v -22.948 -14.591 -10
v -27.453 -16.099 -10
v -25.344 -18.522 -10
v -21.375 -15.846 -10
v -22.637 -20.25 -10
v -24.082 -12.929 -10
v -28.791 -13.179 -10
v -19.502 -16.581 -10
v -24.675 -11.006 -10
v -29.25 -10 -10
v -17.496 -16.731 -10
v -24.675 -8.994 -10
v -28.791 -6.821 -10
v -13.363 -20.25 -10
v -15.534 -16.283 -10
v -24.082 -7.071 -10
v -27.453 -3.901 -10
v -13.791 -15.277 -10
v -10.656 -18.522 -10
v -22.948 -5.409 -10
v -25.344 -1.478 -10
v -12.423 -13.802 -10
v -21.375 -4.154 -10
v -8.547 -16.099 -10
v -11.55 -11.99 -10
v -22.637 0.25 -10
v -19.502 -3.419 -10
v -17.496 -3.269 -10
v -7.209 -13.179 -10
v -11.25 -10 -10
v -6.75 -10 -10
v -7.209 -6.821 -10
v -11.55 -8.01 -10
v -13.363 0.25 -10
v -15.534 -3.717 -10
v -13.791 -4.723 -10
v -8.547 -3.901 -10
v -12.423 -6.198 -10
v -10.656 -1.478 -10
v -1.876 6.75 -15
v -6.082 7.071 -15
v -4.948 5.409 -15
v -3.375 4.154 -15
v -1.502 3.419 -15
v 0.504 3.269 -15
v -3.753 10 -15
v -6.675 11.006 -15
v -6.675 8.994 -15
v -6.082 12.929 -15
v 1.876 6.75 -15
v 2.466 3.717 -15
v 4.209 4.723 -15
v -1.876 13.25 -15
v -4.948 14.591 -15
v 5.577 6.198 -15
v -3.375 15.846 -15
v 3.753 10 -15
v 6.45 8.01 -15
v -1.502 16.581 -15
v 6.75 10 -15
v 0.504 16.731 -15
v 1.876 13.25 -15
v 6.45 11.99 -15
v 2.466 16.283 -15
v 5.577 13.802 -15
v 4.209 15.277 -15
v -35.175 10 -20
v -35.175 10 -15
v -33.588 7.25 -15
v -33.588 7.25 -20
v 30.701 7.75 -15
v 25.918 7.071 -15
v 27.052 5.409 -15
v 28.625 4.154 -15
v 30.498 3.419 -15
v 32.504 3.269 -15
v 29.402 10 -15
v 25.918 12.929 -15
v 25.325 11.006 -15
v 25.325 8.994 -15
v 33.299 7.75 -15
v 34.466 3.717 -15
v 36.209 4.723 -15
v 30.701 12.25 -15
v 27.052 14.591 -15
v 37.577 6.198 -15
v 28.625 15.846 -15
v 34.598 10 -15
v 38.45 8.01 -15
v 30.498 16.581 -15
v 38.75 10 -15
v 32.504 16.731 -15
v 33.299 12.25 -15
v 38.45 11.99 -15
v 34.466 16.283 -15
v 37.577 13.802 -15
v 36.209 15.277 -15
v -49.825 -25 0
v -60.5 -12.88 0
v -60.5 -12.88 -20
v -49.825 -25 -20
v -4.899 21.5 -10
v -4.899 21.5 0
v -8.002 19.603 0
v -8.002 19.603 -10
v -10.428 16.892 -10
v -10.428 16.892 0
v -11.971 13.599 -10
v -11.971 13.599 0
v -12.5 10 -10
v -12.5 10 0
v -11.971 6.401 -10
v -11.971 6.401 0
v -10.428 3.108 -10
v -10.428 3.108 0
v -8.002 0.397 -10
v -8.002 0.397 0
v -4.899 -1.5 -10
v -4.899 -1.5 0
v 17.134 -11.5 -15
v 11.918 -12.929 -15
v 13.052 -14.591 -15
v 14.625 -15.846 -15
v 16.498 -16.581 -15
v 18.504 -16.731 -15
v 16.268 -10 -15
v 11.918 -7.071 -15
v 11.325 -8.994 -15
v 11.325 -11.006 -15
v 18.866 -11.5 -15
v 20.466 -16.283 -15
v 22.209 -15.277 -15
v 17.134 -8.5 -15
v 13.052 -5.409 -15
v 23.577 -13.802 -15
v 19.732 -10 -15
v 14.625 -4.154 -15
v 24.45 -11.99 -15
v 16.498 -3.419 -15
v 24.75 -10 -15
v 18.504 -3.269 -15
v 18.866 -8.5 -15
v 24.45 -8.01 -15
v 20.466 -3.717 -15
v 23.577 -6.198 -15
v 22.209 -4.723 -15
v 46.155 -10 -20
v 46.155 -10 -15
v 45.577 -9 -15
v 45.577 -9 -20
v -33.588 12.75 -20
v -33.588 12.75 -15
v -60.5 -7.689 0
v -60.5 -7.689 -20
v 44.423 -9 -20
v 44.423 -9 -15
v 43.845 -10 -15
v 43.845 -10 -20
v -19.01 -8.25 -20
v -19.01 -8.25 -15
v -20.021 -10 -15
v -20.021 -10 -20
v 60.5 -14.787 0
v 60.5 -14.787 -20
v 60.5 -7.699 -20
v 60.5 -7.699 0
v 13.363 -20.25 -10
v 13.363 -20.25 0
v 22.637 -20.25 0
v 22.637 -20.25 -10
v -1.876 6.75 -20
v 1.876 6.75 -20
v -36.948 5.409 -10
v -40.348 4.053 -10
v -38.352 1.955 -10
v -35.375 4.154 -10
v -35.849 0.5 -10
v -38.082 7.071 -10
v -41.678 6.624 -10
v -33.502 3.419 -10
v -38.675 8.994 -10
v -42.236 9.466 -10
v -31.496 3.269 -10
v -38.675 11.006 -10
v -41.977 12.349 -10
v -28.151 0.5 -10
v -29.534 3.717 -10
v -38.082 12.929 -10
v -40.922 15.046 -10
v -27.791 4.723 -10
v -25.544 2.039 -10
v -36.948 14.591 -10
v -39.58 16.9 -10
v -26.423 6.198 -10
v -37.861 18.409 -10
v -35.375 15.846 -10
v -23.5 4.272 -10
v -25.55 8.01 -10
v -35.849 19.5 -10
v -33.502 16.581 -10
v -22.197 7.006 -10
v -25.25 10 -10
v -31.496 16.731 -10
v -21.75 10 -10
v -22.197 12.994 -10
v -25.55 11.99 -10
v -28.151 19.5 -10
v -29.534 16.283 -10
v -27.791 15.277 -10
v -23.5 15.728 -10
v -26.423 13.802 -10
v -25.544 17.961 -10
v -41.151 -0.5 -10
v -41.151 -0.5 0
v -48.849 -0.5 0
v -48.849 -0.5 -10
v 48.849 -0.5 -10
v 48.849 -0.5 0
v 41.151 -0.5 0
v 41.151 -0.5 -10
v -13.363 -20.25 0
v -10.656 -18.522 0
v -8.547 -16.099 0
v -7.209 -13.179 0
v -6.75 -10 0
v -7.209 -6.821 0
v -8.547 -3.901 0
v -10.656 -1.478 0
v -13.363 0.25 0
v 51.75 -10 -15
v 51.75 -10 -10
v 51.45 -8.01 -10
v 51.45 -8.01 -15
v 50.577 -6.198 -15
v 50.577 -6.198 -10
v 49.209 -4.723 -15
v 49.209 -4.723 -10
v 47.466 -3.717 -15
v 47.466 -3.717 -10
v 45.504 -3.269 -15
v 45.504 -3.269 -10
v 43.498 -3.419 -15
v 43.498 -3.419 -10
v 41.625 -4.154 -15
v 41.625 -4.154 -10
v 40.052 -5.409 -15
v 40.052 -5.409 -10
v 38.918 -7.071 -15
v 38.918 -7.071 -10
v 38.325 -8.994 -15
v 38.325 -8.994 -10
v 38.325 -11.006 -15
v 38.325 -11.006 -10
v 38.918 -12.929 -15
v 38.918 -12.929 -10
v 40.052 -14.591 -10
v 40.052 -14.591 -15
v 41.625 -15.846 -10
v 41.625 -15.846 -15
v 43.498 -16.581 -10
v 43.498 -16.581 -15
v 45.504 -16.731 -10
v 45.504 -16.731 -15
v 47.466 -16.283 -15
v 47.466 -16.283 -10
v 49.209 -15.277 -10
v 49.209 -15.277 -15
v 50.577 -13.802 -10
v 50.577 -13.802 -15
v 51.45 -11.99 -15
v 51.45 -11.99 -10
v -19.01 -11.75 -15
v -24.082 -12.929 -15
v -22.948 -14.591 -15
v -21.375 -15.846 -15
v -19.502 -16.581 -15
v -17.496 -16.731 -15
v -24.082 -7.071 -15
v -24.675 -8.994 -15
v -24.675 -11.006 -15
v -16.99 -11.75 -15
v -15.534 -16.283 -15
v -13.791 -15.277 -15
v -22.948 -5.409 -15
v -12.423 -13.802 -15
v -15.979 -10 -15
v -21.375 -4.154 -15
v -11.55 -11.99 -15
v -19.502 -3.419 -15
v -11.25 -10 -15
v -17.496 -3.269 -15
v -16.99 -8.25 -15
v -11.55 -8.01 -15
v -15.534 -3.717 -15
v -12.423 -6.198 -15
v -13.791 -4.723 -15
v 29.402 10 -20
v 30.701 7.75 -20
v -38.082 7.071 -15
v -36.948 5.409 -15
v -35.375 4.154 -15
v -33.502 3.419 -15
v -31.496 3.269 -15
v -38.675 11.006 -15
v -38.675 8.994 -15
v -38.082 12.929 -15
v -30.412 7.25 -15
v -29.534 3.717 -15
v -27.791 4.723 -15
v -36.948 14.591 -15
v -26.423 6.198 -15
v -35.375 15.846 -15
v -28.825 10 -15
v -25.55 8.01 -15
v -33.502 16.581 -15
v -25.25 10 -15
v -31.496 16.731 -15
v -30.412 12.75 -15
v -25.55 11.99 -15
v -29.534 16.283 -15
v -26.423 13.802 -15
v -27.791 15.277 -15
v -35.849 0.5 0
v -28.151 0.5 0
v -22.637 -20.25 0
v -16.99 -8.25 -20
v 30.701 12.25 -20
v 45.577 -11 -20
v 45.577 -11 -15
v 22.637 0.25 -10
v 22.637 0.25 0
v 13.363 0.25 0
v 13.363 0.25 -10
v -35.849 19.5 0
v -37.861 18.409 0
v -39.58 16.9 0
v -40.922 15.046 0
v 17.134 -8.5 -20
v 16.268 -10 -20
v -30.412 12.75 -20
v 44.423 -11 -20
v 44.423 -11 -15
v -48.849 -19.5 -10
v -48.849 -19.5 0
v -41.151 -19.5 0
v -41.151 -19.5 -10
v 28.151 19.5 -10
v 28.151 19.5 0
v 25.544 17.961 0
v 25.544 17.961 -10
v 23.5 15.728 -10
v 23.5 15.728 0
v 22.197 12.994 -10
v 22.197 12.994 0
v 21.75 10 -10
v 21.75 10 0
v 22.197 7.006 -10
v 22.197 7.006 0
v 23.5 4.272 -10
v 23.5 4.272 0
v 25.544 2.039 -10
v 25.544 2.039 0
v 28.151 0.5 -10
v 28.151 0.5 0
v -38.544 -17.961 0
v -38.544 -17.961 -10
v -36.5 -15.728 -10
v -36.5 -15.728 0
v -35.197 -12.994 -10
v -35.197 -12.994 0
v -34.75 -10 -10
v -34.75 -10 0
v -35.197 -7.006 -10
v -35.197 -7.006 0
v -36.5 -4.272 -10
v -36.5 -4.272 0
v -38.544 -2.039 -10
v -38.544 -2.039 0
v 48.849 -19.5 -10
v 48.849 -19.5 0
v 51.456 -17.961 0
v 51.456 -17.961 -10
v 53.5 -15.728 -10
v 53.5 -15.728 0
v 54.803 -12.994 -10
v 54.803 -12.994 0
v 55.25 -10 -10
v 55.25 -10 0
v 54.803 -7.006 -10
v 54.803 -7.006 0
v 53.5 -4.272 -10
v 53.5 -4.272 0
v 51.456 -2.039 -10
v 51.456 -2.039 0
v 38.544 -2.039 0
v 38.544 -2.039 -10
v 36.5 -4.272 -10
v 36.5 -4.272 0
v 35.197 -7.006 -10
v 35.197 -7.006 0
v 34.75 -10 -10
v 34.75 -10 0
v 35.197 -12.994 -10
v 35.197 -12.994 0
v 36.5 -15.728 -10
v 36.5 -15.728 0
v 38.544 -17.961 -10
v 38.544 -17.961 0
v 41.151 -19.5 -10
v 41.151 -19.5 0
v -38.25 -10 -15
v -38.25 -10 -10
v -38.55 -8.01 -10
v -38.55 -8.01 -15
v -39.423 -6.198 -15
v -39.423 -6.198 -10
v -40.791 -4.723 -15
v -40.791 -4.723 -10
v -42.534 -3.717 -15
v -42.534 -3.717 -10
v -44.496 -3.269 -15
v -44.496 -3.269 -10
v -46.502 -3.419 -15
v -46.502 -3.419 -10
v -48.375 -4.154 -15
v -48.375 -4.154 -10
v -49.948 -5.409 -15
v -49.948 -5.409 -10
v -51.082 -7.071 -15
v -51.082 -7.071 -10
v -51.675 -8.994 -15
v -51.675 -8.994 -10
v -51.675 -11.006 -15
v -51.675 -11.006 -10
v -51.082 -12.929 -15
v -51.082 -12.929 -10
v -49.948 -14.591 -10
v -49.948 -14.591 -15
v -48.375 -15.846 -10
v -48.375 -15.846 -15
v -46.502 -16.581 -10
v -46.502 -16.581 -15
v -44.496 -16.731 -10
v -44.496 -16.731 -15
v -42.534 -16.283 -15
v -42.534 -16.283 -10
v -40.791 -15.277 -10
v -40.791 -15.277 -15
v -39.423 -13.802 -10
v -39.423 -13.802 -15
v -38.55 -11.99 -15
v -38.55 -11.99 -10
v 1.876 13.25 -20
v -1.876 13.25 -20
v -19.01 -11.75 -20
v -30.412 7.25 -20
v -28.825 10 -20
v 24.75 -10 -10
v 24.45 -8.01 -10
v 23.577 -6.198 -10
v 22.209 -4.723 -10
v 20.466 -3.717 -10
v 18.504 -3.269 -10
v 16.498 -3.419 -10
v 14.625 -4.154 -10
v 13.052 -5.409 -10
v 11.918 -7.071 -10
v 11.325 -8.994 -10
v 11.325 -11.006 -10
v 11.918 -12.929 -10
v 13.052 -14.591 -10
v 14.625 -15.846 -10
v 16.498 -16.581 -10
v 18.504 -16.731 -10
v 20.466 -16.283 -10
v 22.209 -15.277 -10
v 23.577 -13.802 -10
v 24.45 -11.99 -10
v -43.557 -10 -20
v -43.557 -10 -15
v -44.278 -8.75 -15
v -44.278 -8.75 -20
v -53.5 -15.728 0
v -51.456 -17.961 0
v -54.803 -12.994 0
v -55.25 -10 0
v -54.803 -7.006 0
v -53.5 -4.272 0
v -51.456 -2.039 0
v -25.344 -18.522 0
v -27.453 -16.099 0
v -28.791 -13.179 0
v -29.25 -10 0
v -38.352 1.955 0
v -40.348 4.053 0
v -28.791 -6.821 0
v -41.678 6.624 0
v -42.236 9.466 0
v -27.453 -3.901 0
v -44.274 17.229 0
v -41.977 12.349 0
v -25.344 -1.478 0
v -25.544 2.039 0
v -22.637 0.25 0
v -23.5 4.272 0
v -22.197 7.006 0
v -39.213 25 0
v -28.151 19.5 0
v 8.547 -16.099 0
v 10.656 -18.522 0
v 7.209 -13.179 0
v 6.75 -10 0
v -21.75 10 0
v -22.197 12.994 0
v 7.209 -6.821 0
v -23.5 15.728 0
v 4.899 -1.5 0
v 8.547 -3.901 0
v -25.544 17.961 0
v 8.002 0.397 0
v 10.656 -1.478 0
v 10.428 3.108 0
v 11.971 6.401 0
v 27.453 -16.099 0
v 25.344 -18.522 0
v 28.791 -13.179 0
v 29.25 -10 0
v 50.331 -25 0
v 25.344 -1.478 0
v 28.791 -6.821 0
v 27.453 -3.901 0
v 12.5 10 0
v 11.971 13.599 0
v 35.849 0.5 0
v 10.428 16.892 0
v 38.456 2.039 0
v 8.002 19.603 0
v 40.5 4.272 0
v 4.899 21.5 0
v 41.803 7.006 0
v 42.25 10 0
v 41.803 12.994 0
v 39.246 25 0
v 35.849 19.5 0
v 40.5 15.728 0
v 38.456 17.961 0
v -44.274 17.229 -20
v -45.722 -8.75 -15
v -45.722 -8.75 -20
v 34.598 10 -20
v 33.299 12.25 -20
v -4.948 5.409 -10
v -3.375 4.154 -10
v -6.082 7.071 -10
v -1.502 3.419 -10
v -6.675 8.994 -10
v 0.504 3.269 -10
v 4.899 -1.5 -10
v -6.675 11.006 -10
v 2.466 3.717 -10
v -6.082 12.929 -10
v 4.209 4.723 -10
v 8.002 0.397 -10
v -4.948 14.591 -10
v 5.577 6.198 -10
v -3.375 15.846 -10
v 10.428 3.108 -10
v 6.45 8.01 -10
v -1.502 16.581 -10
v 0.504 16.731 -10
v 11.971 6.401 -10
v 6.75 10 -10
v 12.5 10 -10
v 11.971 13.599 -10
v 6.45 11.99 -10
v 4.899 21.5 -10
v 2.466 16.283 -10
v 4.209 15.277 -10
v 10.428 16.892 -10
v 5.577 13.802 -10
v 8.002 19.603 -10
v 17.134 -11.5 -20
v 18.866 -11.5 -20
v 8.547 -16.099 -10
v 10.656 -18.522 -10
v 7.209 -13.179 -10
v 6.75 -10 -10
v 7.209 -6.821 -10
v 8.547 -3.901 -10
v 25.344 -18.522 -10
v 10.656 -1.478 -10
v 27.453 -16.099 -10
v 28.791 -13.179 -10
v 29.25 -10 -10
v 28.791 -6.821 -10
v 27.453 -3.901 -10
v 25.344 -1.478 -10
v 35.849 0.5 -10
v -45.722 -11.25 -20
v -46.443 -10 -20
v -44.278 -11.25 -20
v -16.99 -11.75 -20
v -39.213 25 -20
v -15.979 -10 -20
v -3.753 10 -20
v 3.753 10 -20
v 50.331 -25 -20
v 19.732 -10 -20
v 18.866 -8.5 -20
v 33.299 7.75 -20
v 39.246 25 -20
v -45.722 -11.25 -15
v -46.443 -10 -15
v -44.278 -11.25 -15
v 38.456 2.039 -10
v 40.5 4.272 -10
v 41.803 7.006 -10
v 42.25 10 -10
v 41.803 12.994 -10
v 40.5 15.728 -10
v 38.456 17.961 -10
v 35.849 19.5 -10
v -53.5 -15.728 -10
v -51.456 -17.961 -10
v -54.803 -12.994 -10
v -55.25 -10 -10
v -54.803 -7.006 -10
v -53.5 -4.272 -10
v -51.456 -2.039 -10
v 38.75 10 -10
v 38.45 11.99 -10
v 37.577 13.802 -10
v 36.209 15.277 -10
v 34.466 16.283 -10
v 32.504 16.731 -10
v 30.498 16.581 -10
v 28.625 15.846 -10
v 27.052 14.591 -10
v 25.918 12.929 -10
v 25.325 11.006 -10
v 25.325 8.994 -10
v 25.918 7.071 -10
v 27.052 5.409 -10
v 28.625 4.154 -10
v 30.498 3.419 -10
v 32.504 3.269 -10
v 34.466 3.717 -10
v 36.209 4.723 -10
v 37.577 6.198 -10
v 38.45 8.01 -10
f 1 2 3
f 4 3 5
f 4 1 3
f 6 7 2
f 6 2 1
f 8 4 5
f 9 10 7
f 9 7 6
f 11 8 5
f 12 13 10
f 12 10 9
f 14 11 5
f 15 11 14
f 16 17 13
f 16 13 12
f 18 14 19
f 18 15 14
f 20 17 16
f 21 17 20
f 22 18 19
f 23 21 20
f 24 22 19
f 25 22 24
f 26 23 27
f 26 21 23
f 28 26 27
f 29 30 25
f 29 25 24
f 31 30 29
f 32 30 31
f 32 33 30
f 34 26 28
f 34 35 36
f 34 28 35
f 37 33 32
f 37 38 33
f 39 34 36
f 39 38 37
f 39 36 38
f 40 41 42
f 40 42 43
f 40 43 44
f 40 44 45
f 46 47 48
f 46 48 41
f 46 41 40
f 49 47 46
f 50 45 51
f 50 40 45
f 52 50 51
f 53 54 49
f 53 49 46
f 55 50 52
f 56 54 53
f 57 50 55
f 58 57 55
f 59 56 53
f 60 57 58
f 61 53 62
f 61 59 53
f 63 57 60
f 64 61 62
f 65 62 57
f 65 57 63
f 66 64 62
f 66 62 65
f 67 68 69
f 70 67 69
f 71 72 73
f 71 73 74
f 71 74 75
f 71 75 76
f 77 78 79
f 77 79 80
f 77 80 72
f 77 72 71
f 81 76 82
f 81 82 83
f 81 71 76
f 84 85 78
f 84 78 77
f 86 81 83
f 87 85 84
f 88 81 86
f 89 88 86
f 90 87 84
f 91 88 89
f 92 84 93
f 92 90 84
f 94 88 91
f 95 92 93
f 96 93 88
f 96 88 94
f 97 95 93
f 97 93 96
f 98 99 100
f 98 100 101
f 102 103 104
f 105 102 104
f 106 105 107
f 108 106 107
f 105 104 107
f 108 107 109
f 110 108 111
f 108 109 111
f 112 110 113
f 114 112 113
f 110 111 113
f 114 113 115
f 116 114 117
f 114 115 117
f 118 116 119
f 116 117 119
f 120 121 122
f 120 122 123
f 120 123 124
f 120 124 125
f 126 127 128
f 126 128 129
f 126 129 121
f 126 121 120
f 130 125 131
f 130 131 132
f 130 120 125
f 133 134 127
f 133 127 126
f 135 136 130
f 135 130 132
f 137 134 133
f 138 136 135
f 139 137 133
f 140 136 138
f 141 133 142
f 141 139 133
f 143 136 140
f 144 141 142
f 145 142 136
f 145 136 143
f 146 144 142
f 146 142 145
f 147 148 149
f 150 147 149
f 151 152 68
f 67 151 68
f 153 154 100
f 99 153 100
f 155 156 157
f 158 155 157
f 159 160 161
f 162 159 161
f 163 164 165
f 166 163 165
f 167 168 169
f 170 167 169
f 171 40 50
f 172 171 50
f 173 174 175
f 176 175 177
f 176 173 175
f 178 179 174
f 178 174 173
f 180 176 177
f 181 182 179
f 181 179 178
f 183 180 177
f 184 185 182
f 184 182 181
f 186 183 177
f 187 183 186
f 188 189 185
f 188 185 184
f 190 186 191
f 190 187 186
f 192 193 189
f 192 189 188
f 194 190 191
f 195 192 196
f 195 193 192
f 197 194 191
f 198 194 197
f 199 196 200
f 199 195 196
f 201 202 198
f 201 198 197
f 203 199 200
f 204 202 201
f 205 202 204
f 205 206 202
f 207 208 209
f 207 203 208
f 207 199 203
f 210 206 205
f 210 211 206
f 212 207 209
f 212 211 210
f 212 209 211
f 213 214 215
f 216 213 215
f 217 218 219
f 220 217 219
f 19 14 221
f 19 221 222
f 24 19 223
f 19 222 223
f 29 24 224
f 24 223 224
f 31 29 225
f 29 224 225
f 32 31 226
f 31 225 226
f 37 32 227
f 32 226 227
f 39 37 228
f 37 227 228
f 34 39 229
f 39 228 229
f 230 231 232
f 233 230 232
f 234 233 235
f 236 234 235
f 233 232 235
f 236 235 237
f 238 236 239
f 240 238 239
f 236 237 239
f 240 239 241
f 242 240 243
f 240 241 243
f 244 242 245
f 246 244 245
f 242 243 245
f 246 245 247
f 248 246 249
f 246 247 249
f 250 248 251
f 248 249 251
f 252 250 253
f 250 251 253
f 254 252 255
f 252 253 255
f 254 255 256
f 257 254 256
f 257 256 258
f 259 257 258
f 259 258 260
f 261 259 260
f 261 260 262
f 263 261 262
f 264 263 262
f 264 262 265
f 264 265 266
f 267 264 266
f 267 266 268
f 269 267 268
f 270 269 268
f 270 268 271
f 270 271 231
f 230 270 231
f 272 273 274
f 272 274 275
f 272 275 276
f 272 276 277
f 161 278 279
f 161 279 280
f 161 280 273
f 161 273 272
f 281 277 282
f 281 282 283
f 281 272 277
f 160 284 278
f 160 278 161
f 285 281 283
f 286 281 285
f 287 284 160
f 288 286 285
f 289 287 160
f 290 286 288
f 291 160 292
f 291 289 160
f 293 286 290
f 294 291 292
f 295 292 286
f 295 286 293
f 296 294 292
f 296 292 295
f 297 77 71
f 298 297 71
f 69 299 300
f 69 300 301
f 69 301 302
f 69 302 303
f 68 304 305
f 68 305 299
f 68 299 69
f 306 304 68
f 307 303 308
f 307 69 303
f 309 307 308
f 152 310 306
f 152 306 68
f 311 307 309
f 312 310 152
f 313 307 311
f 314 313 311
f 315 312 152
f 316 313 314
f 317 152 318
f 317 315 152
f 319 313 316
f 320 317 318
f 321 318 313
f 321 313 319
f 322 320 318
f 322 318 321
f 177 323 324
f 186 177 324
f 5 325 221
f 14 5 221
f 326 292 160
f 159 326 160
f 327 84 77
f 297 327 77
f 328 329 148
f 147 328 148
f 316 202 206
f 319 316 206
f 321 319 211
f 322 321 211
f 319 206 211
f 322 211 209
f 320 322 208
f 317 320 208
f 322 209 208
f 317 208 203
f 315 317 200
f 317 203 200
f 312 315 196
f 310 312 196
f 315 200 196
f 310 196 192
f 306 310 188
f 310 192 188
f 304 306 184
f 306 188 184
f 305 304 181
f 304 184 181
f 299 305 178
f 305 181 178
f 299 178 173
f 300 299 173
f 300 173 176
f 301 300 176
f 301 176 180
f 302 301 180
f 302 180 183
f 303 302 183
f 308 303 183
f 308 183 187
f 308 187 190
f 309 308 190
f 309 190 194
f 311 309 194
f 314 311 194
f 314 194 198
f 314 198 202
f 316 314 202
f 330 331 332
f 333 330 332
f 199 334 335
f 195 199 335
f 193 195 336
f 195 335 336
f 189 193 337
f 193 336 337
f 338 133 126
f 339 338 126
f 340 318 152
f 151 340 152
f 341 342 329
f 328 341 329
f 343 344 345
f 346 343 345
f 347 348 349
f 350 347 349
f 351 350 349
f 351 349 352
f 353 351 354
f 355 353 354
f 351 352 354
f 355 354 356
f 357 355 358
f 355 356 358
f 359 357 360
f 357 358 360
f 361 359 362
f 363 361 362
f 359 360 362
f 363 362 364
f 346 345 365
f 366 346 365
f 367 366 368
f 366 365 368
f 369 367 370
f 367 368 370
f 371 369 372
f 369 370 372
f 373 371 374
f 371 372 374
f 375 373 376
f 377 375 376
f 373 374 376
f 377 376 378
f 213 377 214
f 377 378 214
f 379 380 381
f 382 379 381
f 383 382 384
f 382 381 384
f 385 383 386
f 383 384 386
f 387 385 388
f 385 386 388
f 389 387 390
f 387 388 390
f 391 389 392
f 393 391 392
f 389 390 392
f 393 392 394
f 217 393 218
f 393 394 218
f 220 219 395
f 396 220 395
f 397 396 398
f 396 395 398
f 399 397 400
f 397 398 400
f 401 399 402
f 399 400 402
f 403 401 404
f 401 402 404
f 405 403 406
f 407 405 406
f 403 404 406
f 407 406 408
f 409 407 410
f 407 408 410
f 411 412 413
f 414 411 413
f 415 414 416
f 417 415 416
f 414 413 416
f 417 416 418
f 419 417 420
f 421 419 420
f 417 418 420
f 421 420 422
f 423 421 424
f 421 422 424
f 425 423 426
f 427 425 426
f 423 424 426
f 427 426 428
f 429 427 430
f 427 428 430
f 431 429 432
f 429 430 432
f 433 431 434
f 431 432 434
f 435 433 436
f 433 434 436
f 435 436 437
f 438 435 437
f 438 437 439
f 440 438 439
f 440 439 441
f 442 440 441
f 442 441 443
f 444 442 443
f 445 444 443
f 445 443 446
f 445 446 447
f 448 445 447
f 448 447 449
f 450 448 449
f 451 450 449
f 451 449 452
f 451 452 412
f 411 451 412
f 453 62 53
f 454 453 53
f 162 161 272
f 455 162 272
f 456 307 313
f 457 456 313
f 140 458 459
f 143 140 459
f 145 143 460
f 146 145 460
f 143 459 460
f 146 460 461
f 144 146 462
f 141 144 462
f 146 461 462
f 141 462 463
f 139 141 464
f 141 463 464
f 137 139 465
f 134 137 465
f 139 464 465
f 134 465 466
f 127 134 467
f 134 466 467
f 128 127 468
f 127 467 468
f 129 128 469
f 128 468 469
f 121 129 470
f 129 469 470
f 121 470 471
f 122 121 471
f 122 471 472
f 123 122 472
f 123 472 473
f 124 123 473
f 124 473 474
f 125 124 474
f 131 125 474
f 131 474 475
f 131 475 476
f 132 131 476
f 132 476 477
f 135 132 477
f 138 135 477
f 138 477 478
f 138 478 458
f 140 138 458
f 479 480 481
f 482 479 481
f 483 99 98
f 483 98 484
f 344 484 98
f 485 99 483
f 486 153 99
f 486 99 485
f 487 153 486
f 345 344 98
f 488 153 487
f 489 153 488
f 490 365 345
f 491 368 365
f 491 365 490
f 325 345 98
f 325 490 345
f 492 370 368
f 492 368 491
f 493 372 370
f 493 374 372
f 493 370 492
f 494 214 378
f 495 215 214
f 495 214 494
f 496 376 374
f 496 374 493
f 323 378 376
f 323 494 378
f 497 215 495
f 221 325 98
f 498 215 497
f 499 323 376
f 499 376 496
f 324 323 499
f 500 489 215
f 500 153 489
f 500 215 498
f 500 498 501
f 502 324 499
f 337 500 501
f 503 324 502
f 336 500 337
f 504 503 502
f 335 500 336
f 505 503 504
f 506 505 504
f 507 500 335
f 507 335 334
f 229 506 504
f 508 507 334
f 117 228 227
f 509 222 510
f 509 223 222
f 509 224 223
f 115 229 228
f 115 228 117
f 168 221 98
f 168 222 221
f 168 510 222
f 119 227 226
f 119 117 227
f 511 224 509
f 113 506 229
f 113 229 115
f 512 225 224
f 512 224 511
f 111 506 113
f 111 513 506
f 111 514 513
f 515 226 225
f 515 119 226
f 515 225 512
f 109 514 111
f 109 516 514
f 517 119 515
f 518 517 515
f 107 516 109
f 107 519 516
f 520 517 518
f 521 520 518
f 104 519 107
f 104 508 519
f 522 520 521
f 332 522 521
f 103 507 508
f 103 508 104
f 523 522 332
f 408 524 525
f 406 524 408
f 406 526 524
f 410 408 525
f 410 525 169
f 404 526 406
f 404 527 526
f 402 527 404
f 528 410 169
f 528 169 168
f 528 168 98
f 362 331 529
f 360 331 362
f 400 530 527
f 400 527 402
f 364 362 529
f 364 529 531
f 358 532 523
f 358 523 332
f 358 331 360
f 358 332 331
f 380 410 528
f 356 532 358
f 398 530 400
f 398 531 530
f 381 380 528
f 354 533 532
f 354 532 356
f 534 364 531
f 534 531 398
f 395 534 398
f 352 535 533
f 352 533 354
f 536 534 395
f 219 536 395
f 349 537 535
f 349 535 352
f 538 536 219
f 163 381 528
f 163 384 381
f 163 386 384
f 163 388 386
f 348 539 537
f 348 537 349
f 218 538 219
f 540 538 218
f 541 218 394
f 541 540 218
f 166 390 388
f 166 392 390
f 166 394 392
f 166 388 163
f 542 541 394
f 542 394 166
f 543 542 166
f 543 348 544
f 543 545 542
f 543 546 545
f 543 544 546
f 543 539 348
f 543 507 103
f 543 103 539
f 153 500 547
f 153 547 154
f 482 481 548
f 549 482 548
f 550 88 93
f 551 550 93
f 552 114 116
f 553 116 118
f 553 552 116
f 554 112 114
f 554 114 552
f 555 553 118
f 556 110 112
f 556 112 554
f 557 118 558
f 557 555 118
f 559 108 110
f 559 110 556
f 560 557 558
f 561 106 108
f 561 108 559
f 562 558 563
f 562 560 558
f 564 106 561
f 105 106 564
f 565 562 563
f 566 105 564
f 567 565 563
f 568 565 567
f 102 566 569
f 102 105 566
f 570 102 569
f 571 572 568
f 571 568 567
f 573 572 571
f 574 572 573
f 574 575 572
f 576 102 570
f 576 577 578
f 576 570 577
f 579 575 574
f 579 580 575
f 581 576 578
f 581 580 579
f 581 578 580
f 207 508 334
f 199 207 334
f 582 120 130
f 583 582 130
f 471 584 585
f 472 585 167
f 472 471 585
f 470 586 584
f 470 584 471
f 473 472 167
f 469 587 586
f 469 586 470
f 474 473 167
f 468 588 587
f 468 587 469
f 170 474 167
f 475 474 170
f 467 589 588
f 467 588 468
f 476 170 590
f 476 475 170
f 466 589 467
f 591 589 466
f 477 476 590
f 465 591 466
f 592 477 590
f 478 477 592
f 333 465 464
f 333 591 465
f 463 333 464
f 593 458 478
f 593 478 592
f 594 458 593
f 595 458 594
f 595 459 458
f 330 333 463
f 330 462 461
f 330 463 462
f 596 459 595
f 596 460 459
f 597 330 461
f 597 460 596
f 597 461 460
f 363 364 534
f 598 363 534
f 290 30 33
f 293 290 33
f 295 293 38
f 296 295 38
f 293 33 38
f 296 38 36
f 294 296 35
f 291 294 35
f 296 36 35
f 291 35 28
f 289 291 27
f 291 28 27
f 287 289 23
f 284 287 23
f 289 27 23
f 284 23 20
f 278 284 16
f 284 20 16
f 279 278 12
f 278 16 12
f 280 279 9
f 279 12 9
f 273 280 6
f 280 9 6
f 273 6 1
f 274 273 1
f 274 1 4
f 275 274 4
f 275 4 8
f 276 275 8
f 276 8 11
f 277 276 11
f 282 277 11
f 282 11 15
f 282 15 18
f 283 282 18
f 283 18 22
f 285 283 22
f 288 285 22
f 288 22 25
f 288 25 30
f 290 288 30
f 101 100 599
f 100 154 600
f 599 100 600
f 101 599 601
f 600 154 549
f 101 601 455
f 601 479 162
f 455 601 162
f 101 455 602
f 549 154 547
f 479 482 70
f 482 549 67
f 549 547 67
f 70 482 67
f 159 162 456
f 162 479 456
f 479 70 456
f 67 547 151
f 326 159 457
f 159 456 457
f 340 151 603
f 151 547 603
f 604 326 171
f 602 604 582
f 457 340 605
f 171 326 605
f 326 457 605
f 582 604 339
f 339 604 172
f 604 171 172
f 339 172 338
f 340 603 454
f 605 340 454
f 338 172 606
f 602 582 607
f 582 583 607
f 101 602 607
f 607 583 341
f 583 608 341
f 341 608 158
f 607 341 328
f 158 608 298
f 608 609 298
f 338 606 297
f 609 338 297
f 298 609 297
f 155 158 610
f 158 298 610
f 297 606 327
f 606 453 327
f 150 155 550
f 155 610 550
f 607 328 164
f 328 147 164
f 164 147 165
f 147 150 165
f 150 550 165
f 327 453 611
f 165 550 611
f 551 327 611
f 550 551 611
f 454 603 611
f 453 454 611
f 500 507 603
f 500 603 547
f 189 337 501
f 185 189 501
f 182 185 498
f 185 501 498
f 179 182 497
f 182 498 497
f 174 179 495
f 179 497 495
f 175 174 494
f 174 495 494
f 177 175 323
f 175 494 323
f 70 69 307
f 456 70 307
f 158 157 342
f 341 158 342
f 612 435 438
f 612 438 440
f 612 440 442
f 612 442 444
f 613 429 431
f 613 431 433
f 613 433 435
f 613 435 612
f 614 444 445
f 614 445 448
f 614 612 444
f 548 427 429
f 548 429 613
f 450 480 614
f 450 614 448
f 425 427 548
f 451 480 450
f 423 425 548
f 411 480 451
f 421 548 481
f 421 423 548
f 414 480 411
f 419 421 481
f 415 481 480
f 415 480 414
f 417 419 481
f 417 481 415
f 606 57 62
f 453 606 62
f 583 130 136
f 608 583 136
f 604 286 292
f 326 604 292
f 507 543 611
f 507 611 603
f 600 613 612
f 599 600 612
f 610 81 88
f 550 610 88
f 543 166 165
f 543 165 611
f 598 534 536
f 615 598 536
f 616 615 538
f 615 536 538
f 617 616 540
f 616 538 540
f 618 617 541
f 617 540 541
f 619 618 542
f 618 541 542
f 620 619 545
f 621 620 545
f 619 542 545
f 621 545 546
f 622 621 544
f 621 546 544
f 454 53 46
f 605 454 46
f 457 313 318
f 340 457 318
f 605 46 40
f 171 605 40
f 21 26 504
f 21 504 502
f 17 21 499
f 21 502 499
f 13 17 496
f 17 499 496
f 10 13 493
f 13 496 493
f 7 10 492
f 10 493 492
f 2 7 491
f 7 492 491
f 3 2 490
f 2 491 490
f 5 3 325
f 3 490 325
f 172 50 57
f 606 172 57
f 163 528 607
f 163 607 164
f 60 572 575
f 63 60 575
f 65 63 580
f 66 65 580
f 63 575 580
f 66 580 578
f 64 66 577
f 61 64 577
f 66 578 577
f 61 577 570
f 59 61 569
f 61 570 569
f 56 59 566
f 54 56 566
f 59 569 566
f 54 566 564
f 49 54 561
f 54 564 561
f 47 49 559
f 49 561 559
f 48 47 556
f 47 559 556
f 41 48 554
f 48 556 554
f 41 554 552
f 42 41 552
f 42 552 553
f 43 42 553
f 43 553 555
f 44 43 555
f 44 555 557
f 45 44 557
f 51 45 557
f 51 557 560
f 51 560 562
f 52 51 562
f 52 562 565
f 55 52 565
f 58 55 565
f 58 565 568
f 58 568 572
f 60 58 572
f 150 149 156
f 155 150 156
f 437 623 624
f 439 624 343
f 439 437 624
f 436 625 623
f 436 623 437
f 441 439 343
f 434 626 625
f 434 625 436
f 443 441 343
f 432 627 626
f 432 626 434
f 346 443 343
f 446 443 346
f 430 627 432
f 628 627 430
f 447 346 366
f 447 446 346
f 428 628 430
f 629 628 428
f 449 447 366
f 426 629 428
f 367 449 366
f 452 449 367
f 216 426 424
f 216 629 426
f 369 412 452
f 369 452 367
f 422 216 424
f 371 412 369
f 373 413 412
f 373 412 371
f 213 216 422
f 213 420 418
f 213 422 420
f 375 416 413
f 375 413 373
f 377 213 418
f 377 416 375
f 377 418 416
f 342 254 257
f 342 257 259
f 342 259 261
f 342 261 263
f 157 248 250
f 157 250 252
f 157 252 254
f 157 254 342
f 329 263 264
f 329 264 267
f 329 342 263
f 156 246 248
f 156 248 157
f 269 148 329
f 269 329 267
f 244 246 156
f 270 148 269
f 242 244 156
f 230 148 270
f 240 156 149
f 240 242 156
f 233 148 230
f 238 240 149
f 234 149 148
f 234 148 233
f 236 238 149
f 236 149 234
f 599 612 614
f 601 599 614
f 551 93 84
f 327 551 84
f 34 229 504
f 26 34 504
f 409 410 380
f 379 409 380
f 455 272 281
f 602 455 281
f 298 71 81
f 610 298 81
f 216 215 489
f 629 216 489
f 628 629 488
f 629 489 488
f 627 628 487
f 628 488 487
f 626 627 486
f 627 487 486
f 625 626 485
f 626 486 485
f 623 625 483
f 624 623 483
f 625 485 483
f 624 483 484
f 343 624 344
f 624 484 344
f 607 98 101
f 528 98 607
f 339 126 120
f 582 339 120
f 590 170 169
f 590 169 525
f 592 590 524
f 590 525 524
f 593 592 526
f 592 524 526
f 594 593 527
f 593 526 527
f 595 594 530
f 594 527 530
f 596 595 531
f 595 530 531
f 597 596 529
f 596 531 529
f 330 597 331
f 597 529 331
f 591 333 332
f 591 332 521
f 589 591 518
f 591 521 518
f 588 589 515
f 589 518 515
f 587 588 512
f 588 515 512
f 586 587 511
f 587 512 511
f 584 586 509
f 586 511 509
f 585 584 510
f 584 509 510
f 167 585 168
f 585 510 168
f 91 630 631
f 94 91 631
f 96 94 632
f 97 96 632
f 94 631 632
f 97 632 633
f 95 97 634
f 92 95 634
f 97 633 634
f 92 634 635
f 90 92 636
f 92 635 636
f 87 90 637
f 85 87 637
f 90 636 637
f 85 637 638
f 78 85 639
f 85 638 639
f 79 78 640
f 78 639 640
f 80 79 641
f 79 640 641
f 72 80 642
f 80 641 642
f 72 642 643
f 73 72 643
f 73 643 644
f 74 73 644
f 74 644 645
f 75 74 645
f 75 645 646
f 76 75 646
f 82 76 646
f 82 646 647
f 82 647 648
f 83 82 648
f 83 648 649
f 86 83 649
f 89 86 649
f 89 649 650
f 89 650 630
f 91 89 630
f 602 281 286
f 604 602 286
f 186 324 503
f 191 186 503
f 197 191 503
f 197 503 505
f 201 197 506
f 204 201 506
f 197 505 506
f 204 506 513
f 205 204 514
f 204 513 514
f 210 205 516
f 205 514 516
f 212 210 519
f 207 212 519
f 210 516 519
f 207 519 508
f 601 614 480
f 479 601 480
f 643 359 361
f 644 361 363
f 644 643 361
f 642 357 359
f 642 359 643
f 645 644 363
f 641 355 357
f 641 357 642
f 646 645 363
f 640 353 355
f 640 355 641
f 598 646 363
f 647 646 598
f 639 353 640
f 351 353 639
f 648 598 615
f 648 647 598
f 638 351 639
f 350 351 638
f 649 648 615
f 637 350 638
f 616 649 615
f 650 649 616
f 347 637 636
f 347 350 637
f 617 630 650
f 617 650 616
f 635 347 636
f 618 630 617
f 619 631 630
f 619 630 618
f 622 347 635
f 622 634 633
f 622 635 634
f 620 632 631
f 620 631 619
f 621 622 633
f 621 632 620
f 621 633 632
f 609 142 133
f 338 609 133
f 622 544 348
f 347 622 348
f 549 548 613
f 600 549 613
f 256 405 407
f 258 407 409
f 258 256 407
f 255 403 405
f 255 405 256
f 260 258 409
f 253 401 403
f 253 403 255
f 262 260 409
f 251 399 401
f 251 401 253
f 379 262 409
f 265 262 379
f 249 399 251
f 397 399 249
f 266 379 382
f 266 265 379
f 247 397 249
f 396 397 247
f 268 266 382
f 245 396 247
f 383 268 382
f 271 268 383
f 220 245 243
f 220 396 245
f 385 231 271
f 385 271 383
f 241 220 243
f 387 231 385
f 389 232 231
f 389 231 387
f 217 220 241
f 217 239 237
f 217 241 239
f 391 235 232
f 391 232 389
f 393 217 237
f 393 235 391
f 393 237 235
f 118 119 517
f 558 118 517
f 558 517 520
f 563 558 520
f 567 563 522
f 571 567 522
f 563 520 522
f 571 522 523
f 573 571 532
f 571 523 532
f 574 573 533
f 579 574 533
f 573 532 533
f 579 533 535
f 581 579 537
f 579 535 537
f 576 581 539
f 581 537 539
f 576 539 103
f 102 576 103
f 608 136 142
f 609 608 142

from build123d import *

# Parameters (mm, degrees)
F0_R     = 6.75
F1_DEPTH = 20
F2_DEPTH = 25
F3_DEPTH = 15
F4_DEPTH = 10


with BuildPart() as f1:
    # F0 (on Top) → F1 (new body)
    with BuildSketch(Plane.XY):
        Polygon((39.2457761297, 25), (-39.2132411266, 25), (-44.2739831788, 17.2285289957), (-60.5, -7.6887692861), (-60.5, -12.8802804498), (-49.8254138643, -25), (50.3314169129, -25), (60.5, -14.7866762627), (60.5, -7.6988059543), align=None)
        with BuildLine():
            ThreePointArc((-48.8487010796, -19.5), (-55.25, -10), (-48.8487010796, -0.5))
            Line((-48.8487010796, -0.5), (-41.1512989204, -0.5))
            ThreePointArc((-41.1512989204, -0.5), (-34.75, -10), (-41.1512989204, -19.5))
            Line((-41.1512989204, -19.5), (-48.8487010796, -19.5))
        make_face(mode=Mode.SUBTRACT)
        with BuildLine():
            ThreePointArc((-22.6368092477, -20.25), (-29.25, -10), (-22.6368092477, 0.25))
            Line((-22.6368092477, 0.25), (-13.3631907523, 0.25))
            ThreePointArc((-13.3631907523, 0.25), (-6.75, -10), (-13.3631907523, -20.25))
            Line((-13.3631907523, -20.25), (-22.6368092477, -20.25))
        make_face(mode=Mode.SUBTRACT)
        with BuildLine():
            ThreePointArc((13.3631907523, -20.25), (6.75, -10), (13.3631907523, 0.25))
            Line((13.3631907523, 0.25), (22.6368092477, 0.25))
            ThreePointArc((22.6368092477, 0.25), (29.25, -10), (22.6368092477, -20.25))
            Line((22.6368092477, -20.25), (13.3631907523, -20.25))
        make_face(mode=Mode.SUBTRACT)
        with BuildLine():
            ThreePointArc((41.1512989204, -19.5), (34.75, -10), (41.1512989204, -0.5))
            Line((41.1512989204, -0.5), (48.8487010796, -0.5))
            ThreePointArc((48.8487010796, -0.5), (55.25, -10), (48.8487010796, -19.5))
            Line((48.8487010796, -19.5), (41.1512989204, -19.5))
        make_face(mode=Mode.SUBTRACT)
        with BuildLine():
            ThreePointArc((-35.8487010796, 0.5), (-41.678209871, 6.6243883973), (-40.9220400109, 15.0457607994))
            ThreePointArc((-40.9220400109, 15.0457607994), (-38.7626192199, 17.7025632932), (-35.8487010796, 19.5))
            Line((-35.8487010796, 19.5), (-28.1512989204, 19.5))
            ThreePointArc((-28.1512989204, 19.5), (-21.75, 10), (-28.1512989204, 0.5))
            Line((-28.1512989204, 0.5), (-35.8487010796, 0.5))
        make_face(mode=Mode.SUBTRACT)
        with BuildLine():
            ThreePointArc((-4.8989794856, -1.5), (-12.5, 10), (-4.8989794856, 21.5))
            Line((-4.8989794856, 21.5), (4.8989794856, 21.5))
            ThreePointArc((4.8989794856, 21.5), (12.5, 10), (4.8989794856, -1.5))
            Line((4.8989794856, -1.5), (-4.8989794856, -1.5))
        make_face(mode=Mode.SUBTRACT)
        with BuildLine():
            ThreePointArc((28.1512989204, 0.5), (21.75, 10), (28.1512989204, 19.5))
            Line((28.1512989204, 19.5), (35.8487010796, 19.5))
            ThreePointArc((35.8487010796, 19.5), (42.25, 10), (35.8487010796, 0.5))
            Line((35.8487010796, 0.5), (28.1512989204, 0.5))
        make_face(mode=Mode.SUBTRACT)
        with BuildLine():
            Line((4.8989794856, 21.5), (-4.8989794856, 21.5))
            ThreePointArc((-4.8989794856, 21.5), (-12.5, 10), (-4.8989794856, -1.5))
            Line((-4.8989794856, -1.5), (4.8989794856, -1.5))
            ThreePointArc((4.8989794856, -1.5), (12.5, 10), (4.8989794856, 21.5))
        make_face()
        with Locations((0, 10)):
            Circle(F0_R, mode=Mode.SUBTRACT)
        with BuildLine():
            Line((-13.3631907523, 0.25), (-22.6368092477, 0.25))
            ThreePointArc((-22.6368092477, 0.25), (-29.25, -10), (-22.6368092477, -20.25))
            Line((-22.6368092477, -20.25), (-13.3631907523, -20.25))
            ThreePointArc((-13.3631907523, -20.25), (-6.75, -10), (-13.3631907523, 0.25))
        make_face()
        with Locations((-18, -10)):
            Circle(F0_R, mode=Mode.SUBTRACT)
        with BuildLine():
            Line((22.6368092477, 0.25), (13.3631907523, 0.25))
            ThreePointArc((13.3631907523, 0.25), (6.75, -10), (13.3631907523, -20.25))
            Line((13.3631907523, -20.25), (22.6368092477, -20.25))
            ThreePointArc((22.6368092477, -20.25), (29.25, -10), (22.6368092477, 0.25))
        make_face()
        with Locations((18, -10)):
            Circle(F0_R, mode=Mode.SUBTRACT)
        with BuildLine():
            Line((-41.1512989204, -0.5), (-48.8487010796, -0.5))
            ThreePointArc((-48.8487010796, -0.5), (-55.25, -10), (-48.8487010796, -19.5))
            Line((-48.8487010796, -19.5), (-41.1512989204, -19.5))
            ThreePointArc((-41.1512989204, -19.5), (-34.75, -10), (-41.1512989204, -0.5))
        make_face()
        with Locations((-45, -10)):
            Circle(F0_R, mode=Mode.SUBTRACT)
        with BuildLine():
            ThreePointArc((-35.8487010796, 19.5), (-38.7626192199, 17.7025632932), (-40.9220400109, 15.0457607994))
            ThreePointArc((-40.9220400109, 15.0457607994), (-41.678209871, 6.6243883973), (-35.8487010796, 0.5))
            Line((-35.8487010796, 0.5), (-28.1512989204, 0.5))
            ThreePointArc((-28.1512989204, 0.5), (-21.75, 10), (-28.1512989204, 19.5))
            Line((-28.1512989204, 19.5), (-35.8487010796, 19.5))
        make_face()
        with Locations((-32, 10)):
            Circle(F0_R, mode=Mode.SUBTRACT)
        with BuildLine():
            Line((35.8487010796, 19.5), (28.1512989204, 19.5))
            ThreePointArc((28.1512989204, 19.5), (21.75, 10), (28.1512989204, 0.5))
            Line((28.1512989204, 0.5), (35.8487010796, 0.5))
            ThreePointArc((35.8487010796, 0.5), (42.25, 10), (35.8487010796, 19.5))
        make_face()
        with Locations((32, 10)):
            Circle(F0_R, mode=Mode.SUBTRACT)
        with BuildLine():
            Line((48.8487010796, -0.5), (41.1512989204, -0.5))
            ThreePointArc((41.1512989204, -0.5), (34.75, -10), (41.1512989204, -19.5))
            Line((41.1512989204, -19.5), (48.8487010796, -19.5))
            ThreePointArc((48.8487010796, -19.5), (55.25, -10), (48.8487010796, -0.5))
        make_face()
        with Locations((45, -10)):
            Circle(F0_R, mode=Mode.SUBTRACT)
        with Locations((-45, -10)):
            Circle(F0_R)
        Polygon((-44.2783121635, -8.75), (-43.556624327, -10), (-44.2783121635, -11.25), (-45.7216878365, -11.25), (-46.443375673, -10), (-45.7216878365, -8.75), align=None, mode=Mode.SUBTRACT)
        with Locations((-32, 10)):
            Circle(F0_R)
        Polygon((-33.5877132403, 12.75), (-30.4122867597, 12.75), (-28.8245735195, 10), (-30.4122867597, 7.25), (-33.5877132403, 7.25), (-35.1754264805, 10), align=None, mode=Mode.SUBTRACT)
        with Locations((-18, -10)):
            Circle(F0_R)
        Polygon((-15.9792740578, -10), (-16.9896370289, -11.75), (-19.0103629711, -11.75), (-20.0207259422, -10), (-19.0103629711, -8.25), (-16.9896370289, -8.25), align=None, mode=Mode.SUBTRACT)
        with Locations((0, 10)):
            Circle(F0_R)
        Polygon((3.7527767497, 10), (1.8763883749, 6.75), (-1.8763883749, 6.75), (-3.7527767497, 10), (-1.8763883749, 13.25), (1.8763883749, 13.25), align=None, mode=Mode.SUBTRACT)
        with Locations((18, -10)):
            Circle(F0_R)
        Polygon((19.7320508076, -10), (18.8660254038, -11.5), (17.1339745962, -11.5), (16.2679491924, -10), (17.1339745962, -8.5), (18.8660254038, -8.5), align=None, mode=Mode.SUBTRACT)
        with Locations((32, 10)):
            Circle(F0_R)
        Polygon((33.2990381057, 12.25), (34.5980762114, 10), (33.2990381057, 7.75), (30.7009618943, 7.75), (29.4019237886, 10), (30.7009618943, 12.25), align=None, mode=Mode.SUBTRACT)
        with Locations((45, -10)):
            Circle(F0_R)
        Polygon((46.1547005384, -10), (45.5773502692, -11), (44.4226497308, -11), (43.8452994616, -10), (44.4226497308, -9), (45.5773502692, -9), align=None, mode=Mode.SUBTRACT)
        Polygon((-1.8763883749, 6.75), (1.8763883749, 6.75), (3.7527767497, 10), (1.8763883749, 13.25), (-1.8763883749, 13.25), (-3.7527767497, 10), align=None)
        Polygon((-28.8245735195, 10), (-30.4122867597, 12.75), (-33.5877132403, 12.75), (-35.1754264805, 10), (-33.5877132403, 7.25), (-30.4122867597, 7.25), align=None)
        Polygon((33.2990381057, 7.75), (34.5980762114, 10), (33.2990381057, 12.25), (30.7009618943, 12.25), (29.4019237886, 10), (30.7009618943, 7.75), align=None)
        Polygon((-19.0103629711, -11.75), (-16.9896370289, -11.75), (-15.9792740578, -10), (-16.9896370289, -8.25), (-19.0103629711, -8.25), (-20.0207259422, -10), align=None)
        Polygon((17.1339745962, -11.5), (18.8660254038, -11.5), (19.7320508076, -10), (18.8660254038, -8.5), (17.1339745962, -8.5), (16.2679491924, -10), align=None)
        Polygon((-44.2783121635, -11.25), (-43.556624327, -10), (-44.2783121635, -8.75), (-45.7216878365, -8.75), (-46.443375673, -10), (-45.7216878365, -11.25), align=None)
        Polygon((44.4226497308, -11), (45.5773502692, -11), (46.1547005384, -10), (45.5773502692, -9), (44.4226497308, -9), (43.8452994616, -10), align=None)
    extrude(amount=-F1_DEPTH)

    # F0 (on Top) → F2 (cut)
    with BuildSketch(Plane.XY):
        Polygon((-28.8245735195, 10), (-30.4122867597, 12.75), (-33.5877132403, 12.75), (-35.1754264805, 10), (-33.5877132403, 7.25), (-30.4122867597, 7.25), align=None)
        Polygon((-1.8763883749, 6.75), (1.8763883749, 6.75), (3.7527767497, 10), (1.8763883749, 13.25), (-1.8763883749, 13.25), (-3.7527767497, 10), align=None)
        Polygon((33.2990381057, 7.75), (34.5980762114, 10), (33.2990381057, 12.25), (30.7009618943, 12.25), (29.4019237886, 10), (30.7009618943, 7.75), align=None)
        Polygon((-44.2783121635, -11.25), (-43.556624327, -10), (-44.2783121635, -8.75), (-45.7216878365, -8.75), (-46.443375673, -10), (-45.7216878365, -11.25), align=None)
        Polygon((-19.0103629711, -11.75), (-16.9896370289, -11.75), (-15.9792740578, -10), (-16.9896370289, -8.25), (-19.0103629711, -8.25), (-20.0207259422, -10), align=None)
        Polygon((17.1339745962, -11.5), (18.8660254038, -11.5), (19.7320508076, -10), (18.8660254038, -8.5), (17.1339745962, -8.5), (16.2679491924, -10), align=None)
        Polygon((44.4226497308, -11), (45.5773502692, -11), (46.1547005384, -10), (45.5773502692, -9), (44.4226497308, -9), (43.8452994616, -10), align=None)
    extrude(amount=-F2_DEPTH, mode=Mode.SUBTRACT)

    # F0 (on Top) → F3 (cut)
    with BuildSketch(Plane.XY):
        with Locations((-32, 10)):
            Circle(F0_R)
        Polygon((-33.5877132403, 12.75), (-30.4122867597, 12.75), (-28.8245735195, 10), (-30.4122867597, 7.25), (-33.5877132403, 7.25), (-35.1754264805, 10), align=None, mode=Mode.SUBTRACT)
        with Locations((0, 10)):
            Circle(F0_R)
        Polygon((3.7527767497, 10), (1.8763883749, 6.75), (-1.8763883749, 6.75), (-3.7527767497, 10), (-1.8763883749, 13.25), (1.8763883749, 13.25), align=None, mode=Mode.SUBTRACT)
        with Locations((32, 10)):
            Circle(F0_R)
        Polygon((33.2990381057, 12.25), (34.5980762114, 10), (33.2990381057, 7.75), (30.7009618943, 7.75), (29.4019237886, 10), (30.7009618943, 12.25), align=None, mode=Mode.SUBTRACT)
        with Locations((45, -10)):
            Circle(F0_R)
        Polygon((46.1547005384, -10), (45.5773502692, -11), (44.4226497308, -11), (43.8452994616, -10), (44.4226497308, -9), (45.5773502692, -9), align=None, mode=Mode.SUBTRACT)
        with Locations((18, -10)):
            Circle(F0_R)
        Polygon((19.7320508076, -10), (18.8660254038, -11.5), (17.1339745962, -11.5), (16.2679491924, -10), (17.1339745962, -8.5), (18.8660254038, -8.5), align=None, mode=Mode.SUBTRACT)
        with Locations((-18, -10)):
            Circle(F0_R)
        Polygon((-15.9792740578, -10), (-16.9896370289, -11.75), (-19.0103629711, -11.75), (-20.0207259422, -10), (-19.0103629711, -8.25), (-16.9896370289, -8.25), align=None, mode=Mode.SUBTRACT)
        with Locations((-45, -10)):
            Circle(F0_R)
        Polygon((-44.2783121635, -8.75), (-43.556624327, -10), (-44.2783121635, -11.25), (-45.7216878365, -11.25), (-46.443375673, -10), (-45.7216878365, -8.75), align=None, mode=Mode.SUBTRACT)
    extrude(amount=-F3_DEPTH, mode=Mode.SUBTRACT)

    # F0 (on Top) → F4 (cut)
    with BuildSketch(Plane.XY):
        with BuildLine():
            Line((-41.1512989204, -0.5), (-48.8487010796, -0.5))
            ThreePointArc((-48.8487010796, -0.5), (-55.25, -10), (-48.8487010796, -19.5))
            Line((-48.8487010796, -19.5), (-41.1512989204, -19.5))
            ThreePointArc((-41.1512989204, -19.5), (-34.75, -10), (-41.1512989204, -0.5))
        make_face()
        with Locations((-45, -10)):
            Circle(F0_R, mode=Mode.SUBTRACT)
        with BuildLine():
            ThreePointArc((-35.8487010796, 19.5), (-38.7626192199, 17.7025632932), (-40.9220400109, 15.0457607994))
            ThreePointArc((-40.9220400109, 15.0457607994), (-41.678209871, 6.6243883973), (-35.8487010796, 0.5))
            Line((-35.8487010796, 0.5), (-28.1512989204, 0.5))
            ThreePointArc((-28.1512989204, 0.5), (-21.75, 10), (-28.1512989204, 19.5))
            Line((-28.1512989204, 19.5), (-35.8487010796, 19.5))
        make_face()
        with Locations((-32, 10)):
            Circle(F0_R, mode=Mode.SUBTRACT)
        with BuildLine():
            Line((4.8989794856, 21.5), (-4.8989794856, 21.5))
            ThreePointArc((-4.8989794856, 21.5), (-12.5, 10), (-4.8989794856, -1.5))
            Line((-4.8989794856, -1.5), (4.8989794856, -1.5))
            ThreePointArc((4.8989794856, -1.5), (12.5, 10), (4.8989794856, 21.5))
        make_face()
        with Locations((0, 10)):
            Circle(F0_R, mode=Mode.SUBTRACT)
        with BuildLine():
            Line((35.8487010796, 19.5), (28.1512989204, 19.5))
            ThreePointArc((28.1512989204, 19.5), (21.75, 10), (28.1512989204, 0.5))
            Line((28.1512989204, 0.5), (35.8487010796, 0.5))
            ThreePointArc((35.8487010796, 0.5), (42.25, 10), (35.8487010796, 19.5))
        make_face()
        with Locations((32, 10)):
            Circle(F0_R, mode=Mode.SUBTRACT)
        with BuildLine():
            Line((48.8487010796, -0.5), (41.1512989204, -0.5))
            ThreePointArc((41.1512989204, -0.5), (34.75, -10), (41.1512989204, -19.5))
            Line((41.1512989204, -19.5), (48.8487010796, -19.5))
            ThreePointArc((48.8487010796, -19.5), (55.25, -10), (48.8487010796, -0.5))
        make_face()
        with Locations((45, -10)):
            Circle(F0_R, mode=Mode.SUBTRACT)
        with BuildLine():
            Line((22.6368092477, 0.25), (13.3631907523, 0.25))
            ThreePointArc((13.3631907523, 0.25), (6.75, -10), (13.3631907523, -20.25))
            Line((13.3631907523, -20.25), (22.6368092477, -20.25))
            ThreePointArc((22.6368092477, -20.25), (29.25, -10), (22.6368092477, 0.25))
        make_face()
        with Locations((18, -10)):
            Circle(F0_R, mode=Mode.SUBTRACT)
        with BuildLine():
            Line((-13.3631907523, 0.25), (-22.6368092477, 0.25))
            ThreePointArc((-22.6368092477, 0.25), (-29.25, -10), (-22.6368092477, -20.25))
            Line((-22.6368092477, -20.25), (-13.3631907523, -20.25))
            ThreePointArc((-13.3631907523, -20.25), (-6.75, -10), (-13.3631907523, 0.25))
        make_face()
        with Locations((-18, -10)):
            Circle(F0_R, mode=Mode.SUBTRACT)
    extrude(amount=-F4_DEPTH, mode=Mode.SUBTRACT)


solid = f1.part
